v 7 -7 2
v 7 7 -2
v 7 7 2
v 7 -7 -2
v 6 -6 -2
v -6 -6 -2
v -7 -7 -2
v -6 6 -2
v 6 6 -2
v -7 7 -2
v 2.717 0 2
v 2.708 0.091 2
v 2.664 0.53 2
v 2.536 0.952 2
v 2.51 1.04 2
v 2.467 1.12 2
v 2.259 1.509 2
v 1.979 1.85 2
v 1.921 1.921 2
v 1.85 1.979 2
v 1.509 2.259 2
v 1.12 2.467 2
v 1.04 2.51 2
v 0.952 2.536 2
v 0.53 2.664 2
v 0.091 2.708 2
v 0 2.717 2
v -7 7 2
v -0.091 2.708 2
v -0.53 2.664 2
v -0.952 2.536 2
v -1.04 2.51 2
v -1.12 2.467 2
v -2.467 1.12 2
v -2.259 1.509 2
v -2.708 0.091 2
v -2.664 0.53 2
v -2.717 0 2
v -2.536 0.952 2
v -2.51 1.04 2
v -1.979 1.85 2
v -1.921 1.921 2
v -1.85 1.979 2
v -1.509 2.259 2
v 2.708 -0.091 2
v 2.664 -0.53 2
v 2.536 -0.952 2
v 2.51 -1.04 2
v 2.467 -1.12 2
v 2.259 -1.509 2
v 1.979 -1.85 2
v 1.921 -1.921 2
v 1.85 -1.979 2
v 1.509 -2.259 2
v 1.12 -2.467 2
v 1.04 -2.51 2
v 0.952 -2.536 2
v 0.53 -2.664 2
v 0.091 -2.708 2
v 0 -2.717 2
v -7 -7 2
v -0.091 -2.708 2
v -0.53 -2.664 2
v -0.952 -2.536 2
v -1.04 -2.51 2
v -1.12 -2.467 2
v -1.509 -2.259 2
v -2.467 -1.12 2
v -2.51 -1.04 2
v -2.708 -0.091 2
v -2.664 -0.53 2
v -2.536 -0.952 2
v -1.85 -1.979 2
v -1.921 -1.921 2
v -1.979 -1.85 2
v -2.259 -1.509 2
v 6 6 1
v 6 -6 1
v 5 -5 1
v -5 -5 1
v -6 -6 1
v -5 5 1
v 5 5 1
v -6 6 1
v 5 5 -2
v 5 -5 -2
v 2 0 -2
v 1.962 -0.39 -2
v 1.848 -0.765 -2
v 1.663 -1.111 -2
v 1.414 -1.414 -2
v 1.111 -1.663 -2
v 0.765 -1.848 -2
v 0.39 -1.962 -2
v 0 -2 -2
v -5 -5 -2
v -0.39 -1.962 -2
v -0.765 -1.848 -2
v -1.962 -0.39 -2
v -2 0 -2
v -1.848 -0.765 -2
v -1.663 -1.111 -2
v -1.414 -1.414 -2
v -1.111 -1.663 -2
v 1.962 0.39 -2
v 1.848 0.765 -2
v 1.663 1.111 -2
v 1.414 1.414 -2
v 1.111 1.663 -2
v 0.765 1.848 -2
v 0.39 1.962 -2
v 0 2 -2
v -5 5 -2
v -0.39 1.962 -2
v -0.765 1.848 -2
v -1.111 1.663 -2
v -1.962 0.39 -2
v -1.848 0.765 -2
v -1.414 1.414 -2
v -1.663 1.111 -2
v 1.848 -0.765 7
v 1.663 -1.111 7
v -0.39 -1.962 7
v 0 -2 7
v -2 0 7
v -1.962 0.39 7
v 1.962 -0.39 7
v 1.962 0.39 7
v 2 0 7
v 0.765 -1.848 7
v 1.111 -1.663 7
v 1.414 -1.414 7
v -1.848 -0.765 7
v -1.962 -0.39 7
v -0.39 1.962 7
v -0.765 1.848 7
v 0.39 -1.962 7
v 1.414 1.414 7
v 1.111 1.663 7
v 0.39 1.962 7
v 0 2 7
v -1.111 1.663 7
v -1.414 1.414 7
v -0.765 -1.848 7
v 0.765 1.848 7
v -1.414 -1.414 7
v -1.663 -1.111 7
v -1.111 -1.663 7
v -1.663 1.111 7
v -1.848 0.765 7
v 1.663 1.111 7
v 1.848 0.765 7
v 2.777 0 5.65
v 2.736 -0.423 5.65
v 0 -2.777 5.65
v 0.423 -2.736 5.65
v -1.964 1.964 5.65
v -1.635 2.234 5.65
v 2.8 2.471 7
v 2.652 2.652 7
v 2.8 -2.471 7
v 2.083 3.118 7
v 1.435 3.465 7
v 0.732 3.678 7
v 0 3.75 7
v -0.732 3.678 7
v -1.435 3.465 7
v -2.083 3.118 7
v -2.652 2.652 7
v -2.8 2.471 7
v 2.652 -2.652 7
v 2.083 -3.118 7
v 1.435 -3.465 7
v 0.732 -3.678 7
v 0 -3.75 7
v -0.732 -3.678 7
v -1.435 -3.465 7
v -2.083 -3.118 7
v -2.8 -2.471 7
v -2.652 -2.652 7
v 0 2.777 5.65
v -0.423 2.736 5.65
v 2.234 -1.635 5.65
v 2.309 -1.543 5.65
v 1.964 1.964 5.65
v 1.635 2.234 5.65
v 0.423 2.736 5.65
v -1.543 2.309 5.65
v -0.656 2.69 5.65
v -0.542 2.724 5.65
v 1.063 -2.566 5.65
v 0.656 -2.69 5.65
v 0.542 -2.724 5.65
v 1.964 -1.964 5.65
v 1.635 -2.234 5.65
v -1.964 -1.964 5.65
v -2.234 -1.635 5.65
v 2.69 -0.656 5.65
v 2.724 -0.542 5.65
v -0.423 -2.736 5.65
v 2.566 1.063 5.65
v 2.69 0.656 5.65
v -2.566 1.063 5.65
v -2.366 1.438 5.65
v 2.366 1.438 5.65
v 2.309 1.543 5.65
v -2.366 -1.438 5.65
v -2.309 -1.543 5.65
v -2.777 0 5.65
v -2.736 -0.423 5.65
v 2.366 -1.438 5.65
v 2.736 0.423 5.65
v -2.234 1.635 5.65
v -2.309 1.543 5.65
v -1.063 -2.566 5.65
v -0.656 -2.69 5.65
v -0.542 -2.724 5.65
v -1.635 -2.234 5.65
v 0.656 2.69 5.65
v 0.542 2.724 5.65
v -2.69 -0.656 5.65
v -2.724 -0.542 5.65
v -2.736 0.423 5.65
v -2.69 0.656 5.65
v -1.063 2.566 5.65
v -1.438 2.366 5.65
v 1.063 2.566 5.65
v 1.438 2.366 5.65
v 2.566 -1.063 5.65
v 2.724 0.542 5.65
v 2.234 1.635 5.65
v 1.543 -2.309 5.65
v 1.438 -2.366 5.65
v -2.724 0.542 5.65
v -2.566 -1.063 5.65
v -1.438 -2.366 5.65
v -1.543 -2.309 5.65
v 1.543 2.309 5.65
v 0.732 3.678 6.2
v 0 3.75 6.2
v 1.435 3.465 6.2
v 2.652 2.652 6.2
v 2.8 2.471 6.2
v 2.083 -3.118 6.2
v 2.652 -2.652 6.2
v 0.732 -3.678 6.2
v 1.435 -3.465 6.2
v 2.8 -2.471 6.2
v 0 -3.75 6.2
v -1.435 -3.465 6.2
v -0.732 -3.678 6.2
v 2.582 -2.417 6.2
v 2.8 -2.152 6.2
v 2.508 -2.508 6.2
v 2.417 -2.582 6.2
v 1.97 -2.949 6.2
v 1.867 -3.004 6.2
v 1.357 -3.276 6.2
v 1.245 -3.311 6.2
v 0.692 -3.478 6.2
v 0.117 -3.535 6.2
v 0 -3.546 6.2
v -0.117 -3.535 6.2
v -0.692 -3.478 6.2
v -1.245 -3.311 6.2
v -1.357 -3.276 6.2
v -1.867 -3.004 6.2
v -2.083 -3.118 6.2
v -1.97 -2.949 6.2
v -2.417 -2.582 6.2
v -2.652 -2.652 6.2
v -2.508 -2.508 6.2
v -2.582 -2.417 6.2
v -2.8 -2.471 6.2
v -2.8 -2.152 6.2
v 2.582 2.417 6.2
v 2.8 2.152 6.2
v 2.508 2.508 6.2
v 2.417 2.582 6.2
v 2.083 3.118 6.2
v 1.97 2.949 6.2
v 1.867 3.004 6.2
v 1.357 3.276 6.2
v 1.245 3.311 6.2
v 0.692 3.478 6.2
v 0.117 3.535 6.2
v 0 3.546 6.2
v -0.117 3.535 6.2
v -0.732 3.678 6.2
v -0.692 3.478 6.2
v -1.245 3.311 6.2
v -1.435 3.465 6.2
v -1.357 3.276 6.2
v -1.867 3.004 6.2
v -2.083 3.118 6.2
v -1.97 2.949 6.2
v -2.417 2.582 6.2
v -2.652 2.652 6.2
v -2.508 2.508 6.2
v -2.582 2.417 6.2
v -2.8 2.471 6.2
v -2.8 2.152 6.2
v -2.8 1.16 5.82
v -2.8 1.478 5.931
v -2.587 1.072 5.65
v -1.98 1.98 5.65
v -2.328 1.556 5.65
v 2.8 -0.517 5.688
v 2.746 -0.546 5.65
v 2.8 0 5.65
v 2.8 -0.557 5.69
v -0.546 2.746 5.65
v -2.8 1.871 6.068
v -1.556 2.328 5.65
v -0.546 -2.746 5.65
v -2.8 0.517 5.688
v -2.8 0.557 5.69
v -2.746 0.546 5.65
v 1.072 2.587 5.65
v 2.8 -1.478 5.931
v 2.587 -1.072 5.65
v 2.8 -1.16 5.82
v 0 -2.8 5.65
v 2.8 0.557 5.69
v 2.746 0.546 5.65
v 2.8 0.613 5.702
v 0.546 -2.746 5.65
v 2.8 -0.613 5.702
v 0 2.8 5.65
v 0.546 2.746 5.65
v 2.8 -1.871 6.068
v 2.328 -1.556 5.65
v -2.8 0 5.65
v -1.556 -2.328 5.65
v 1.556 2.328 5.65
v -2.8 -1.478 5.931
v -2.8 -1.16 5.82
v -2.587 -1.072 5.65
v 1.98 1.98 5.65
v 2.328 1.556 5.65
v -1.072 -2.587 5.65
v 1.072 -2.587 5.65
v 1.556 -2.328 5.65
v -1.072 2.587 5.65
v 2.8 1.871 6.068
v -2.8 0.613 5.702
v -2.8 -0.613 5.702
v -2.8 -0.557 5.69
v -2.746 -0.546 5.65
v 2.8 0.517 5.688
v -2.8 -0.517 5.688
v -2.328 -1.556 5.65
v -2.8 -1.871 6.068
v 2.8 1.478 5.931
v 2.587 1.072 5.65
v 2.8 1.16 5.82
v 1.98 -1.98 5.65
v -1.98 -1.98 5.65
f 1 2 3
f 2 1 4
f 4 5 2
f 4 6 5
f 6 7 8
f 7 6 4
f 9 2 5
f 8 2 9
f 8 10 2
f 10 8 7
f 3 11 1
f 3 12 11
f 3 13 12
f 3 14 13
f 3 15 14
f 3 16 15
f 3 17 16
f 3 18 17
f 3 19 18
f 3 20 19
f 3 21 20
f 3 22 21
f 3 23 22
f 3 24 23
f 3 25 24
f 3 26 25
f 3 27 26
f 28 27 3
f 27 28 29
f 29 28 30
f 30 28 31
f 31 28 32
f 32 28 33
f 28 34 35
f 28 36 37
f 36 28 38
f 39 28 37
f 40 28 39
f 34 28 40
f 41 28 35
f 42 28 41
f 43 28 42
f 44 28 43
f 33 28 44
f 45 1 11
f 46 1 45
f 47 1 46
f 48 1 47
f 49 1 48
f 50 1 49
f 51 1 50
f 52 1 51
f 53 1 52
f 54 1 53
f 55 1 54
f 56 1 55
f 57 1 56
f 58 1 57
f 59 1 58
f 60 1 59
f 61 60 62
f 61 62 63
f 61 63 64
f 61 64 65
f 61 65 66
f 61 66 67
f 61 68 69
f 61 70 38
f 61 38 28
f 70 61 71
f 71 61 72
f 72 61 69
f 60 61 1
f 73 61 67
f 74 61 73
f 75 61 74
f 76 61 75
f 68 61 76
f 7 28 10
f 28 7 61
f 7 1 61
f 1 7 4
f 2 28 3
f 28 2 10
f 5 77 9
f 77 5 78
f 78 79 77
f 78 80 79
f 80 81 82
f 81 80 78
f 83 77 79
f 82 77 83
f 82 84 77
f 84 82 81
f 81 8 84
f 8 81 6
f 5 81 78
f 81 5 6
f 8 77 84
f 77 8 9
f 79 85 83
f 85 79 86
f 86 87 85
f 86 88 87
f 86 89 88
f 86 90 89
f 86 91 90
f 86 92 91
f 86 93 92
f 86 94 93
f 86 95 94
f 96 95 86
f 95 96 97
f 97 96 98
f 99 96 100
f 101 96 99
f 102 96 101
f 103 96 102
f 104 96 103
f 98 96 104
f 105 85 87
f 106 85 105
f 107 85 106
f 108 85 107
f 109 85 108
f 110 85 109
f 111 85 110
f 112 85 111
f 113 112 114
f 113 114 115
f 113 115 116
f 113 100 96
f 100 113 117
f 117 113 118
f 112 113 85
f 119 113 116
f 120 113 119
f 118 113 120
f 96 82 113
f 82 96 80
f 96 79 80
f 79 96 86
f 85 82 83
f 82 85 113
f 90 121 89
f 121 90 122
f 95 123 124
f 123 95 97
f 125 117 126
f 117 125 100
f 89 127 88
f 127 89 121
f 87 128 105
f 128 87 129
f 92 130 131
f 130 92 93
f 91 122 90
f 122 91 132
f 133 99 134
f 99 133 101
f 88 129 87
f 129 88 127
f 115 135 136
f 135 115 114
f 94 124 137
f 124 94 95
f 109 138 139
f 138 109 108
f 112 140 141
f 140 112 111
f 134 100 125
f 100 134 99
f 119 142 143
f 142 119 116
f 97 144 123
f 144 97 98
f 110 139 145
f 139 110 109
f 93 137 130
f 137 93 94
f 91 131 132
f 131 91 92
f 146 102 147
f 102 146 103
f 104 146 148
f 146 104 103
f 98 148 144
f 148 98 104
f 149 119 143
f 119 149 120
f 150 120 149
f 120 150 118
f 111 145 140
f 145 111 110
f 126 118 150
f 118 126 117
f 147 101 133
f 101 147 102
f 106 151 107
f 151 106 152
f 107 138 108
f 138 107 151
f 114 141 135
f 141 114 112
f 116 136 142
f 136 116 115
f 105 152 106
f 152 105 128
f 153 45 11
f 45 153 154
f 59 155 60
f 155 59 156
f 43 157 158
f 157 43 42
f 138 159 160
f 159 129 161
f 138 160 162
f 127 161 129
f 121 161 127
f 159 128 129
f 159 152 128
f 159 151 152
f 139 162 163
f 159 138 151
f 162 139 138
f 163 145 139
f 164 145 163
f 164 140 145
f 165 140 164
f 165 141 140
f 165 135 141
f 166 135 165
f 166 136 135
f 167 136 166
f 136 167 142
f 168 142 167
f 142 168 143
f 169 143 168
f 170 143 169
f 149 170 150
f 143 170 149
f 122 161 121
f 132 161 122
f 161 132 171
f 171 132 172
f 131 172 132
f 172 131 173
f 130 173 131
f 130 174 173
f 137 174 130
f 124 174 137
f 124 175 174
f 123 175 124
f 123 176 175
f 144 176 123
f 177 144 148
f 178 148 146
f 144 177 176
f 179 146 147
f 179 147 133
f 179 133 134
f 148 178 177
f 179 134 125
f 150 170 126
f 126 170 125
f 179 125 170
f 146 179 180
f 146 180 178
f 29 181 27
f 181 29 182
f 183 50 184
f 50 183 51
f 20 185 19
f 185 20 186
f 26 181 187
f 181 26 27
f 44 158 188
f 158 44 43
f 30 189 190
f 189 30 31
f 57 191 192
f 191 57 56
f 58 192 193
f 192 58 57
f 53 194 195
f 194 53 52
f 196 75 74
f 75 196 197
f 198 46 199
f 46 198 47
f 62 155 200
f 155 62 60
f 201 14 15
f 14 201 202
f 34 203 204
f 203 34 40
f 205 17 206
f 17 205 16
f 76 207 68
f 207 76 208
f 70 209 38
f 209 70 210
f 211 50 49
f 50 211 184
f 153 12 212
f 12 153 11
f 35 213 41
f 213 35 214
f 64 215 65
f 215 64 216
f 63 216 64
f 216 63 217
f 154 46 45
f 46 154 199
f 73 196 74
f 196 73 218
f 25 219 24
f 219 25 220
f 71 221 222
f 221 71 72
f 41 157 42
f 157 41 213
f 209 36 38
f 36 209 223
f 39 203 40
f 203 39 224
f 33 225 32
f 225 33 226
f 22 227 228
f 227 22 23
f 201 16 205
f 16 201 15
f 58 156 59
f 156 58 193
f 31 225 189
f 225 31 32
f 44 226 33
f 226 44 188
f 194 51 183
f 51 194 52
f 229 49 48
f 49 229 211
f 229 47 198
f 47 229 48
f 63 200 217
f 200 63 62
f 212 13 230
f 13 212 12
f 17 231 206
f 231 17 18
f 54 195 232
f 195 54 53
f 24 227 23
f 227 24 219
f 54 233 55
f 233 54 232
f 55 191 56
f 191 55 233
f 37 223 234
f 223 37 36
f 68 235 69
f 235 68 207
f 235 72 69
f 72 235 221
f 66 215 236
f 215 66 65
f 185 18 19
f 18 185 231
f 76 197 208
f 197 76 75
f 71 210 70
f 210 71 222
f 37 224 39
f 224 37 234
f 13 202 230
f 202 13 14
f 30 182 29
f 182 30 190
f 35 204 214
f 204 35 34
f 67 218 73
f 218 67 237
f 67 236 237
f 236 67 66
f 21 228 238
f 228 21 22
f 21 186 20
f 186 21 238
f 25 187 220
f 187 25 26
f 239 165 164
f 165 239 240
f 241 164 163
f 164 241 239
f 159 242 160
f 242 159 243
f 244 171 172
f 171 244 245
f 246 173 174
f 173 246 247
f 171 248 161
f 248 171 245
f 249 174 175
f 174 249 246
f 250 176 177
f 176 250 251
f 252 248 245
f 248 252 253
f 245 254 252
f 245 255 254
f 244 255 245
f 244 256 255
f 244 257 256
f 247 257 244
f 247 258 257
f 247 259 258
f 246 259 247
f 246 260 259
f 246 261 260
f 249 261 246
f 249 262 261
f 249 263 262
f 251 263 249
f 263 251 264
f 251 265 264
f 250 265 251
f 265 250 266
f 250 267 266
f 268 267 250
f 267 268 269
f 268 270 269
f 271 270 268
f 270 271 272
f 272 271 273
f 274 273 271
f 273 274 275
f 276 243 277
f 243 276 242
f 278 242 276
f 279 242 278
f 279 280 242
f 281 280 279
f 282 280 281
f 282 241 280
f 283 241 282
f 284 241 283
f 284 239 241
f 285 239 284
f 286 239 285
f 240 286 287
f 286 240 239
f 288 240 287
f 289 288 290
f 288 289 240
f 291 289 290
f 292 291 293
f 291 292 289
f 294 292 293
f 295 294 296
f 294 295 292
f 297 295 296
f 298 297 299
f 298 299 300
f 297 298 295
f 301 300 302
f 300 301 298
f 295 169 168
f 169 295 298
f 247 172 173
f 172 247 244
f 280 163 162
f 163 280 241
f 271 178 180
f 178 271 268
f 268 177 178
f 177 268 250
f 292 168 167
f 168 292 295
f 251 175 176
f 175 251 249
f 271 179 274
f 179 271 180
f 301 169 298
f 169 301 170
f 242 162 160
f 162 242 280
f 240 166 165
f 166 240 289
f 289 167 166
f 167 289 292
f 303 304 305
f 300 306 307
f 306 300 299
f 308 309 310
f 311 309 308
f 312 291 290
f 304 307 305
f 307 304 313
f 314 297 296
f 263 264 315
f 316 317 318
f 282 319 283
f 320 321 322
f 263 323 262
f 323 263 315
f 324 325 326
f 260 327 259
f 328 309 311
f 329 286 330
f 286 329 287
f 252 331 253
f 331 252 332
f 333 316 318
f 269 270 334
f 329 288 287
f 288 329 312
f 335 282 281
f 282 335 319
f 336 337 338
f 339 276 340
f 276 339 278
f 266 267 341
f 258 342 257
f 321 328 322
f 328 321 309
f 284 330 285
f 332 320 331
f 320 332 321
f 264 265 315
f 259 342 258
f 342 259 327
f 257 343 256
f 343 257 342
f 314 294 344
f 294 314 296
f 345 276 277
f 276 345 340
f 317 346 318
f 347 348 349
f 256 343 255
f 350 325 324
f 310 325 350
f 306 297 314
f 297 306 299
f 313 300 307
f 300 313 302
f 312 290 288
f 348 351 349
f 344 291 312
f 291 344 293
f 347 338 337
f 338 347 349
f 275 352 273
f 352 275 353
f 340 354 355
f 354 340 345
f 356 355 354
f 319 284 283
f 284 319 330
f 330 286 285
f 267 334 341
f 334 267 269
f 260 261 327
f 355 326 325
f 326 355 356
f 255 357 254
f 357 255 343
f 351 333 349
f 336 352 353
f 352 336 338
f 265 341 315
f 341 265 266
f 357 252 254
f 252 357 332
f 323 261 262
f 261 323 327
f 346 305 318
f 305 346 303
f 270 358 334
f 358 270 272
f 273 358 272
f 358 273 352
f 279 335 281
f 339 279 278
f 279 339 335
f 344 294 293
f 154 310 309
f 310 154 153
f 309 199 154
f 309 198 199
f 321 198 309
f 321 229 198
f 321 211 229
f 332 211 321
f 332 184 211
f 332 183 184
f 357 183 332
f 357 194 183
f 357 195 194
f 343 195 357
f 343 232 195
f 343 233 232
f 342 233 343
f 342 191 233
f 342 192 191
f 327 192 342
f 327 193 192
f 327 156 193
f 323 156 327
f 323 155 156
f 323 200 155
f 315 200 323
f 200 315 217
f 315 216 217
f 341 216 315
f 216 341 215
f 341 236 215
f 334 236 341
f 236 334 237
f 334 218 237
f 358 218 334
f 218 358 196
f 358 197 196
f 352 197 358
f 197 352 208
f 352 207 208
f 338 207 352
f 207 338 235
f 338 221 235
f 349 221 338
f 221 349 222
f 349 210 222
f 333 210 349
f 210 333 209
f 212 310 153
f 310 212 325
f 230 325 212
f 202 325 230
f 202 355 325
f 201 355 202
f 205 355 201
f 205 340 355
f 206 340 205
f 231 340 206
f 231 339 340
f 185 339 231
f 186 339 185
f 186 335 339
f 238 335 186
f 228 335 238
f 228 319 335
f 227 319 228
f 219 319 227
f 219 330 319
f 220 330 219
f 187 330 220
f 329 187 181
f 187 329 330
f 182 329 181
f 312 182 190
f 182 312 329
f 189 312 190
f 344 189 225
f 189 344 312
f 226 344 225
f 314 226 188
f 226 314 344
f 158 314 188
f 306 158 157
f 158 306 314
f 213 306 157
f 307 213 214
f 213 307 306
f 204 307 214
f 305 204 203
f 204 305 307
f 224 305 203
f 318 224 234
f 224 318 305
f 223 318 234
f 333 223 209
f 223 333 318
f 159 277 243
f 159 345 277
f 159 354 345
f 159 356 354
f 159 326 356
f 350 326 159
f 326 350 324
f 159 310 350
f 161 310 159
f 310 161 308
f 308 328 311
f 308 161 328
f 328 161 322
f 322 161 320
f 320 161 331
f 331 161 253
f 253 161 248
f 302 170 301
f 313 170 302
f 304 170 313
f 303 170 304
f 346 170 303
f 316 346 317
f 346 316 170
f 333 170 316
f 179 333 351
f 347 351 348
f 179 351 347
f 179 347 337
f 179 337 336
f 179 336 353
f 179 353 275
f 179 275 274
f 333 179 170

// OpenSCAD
module cap(d,t) {
  difference() {
      cube([d+t,d+t,t],center=true);
      translate([0,0,2])
       cube([d+2,d+2,t+2],center=true);
  }
  cube([d,d,t],center=true);
}

module luer(off) {// luer connection
 $fn=32;
 Rin=0.75;
 Rout=1.25;
 

 difference(){
	union(){
		translate([0,0,-off]) cylinder(r1=5.6/2,r2=5.4/2,h=6);
		translate([0,0,-off]) cylinder(r=7.5/2,h=0.8);
      translate([0,0,-off+0.65]) cylinder(r1=7.5/2,r2=5.6/2,h=0.7);
	}
	//inside
	translate([0,0,-off-0.1]) cylinder(r=4.0/2,h=7);
	translate([0,0,-5.1]) cylinder(r1=4.0/2,r2=Rin,h=5.2);
	//notches
	translate([5.6/2,-7.5/2,-off-0.1]) cube([1,7.5,1.8]);
	translate([-5.6/2-1,-7.5/2,-off-0.1]) cube([1,7.5,1.8]);
 }
}


module flow(d,t,rad) {
    difference() {
          cap(d,t);
          cylinder(r=rad,h=2*t,center=true,$fn=32);
    }
    luer(7);
}

//cap(10,4);
rotate([180,0,0]) flow(10,4,2);
